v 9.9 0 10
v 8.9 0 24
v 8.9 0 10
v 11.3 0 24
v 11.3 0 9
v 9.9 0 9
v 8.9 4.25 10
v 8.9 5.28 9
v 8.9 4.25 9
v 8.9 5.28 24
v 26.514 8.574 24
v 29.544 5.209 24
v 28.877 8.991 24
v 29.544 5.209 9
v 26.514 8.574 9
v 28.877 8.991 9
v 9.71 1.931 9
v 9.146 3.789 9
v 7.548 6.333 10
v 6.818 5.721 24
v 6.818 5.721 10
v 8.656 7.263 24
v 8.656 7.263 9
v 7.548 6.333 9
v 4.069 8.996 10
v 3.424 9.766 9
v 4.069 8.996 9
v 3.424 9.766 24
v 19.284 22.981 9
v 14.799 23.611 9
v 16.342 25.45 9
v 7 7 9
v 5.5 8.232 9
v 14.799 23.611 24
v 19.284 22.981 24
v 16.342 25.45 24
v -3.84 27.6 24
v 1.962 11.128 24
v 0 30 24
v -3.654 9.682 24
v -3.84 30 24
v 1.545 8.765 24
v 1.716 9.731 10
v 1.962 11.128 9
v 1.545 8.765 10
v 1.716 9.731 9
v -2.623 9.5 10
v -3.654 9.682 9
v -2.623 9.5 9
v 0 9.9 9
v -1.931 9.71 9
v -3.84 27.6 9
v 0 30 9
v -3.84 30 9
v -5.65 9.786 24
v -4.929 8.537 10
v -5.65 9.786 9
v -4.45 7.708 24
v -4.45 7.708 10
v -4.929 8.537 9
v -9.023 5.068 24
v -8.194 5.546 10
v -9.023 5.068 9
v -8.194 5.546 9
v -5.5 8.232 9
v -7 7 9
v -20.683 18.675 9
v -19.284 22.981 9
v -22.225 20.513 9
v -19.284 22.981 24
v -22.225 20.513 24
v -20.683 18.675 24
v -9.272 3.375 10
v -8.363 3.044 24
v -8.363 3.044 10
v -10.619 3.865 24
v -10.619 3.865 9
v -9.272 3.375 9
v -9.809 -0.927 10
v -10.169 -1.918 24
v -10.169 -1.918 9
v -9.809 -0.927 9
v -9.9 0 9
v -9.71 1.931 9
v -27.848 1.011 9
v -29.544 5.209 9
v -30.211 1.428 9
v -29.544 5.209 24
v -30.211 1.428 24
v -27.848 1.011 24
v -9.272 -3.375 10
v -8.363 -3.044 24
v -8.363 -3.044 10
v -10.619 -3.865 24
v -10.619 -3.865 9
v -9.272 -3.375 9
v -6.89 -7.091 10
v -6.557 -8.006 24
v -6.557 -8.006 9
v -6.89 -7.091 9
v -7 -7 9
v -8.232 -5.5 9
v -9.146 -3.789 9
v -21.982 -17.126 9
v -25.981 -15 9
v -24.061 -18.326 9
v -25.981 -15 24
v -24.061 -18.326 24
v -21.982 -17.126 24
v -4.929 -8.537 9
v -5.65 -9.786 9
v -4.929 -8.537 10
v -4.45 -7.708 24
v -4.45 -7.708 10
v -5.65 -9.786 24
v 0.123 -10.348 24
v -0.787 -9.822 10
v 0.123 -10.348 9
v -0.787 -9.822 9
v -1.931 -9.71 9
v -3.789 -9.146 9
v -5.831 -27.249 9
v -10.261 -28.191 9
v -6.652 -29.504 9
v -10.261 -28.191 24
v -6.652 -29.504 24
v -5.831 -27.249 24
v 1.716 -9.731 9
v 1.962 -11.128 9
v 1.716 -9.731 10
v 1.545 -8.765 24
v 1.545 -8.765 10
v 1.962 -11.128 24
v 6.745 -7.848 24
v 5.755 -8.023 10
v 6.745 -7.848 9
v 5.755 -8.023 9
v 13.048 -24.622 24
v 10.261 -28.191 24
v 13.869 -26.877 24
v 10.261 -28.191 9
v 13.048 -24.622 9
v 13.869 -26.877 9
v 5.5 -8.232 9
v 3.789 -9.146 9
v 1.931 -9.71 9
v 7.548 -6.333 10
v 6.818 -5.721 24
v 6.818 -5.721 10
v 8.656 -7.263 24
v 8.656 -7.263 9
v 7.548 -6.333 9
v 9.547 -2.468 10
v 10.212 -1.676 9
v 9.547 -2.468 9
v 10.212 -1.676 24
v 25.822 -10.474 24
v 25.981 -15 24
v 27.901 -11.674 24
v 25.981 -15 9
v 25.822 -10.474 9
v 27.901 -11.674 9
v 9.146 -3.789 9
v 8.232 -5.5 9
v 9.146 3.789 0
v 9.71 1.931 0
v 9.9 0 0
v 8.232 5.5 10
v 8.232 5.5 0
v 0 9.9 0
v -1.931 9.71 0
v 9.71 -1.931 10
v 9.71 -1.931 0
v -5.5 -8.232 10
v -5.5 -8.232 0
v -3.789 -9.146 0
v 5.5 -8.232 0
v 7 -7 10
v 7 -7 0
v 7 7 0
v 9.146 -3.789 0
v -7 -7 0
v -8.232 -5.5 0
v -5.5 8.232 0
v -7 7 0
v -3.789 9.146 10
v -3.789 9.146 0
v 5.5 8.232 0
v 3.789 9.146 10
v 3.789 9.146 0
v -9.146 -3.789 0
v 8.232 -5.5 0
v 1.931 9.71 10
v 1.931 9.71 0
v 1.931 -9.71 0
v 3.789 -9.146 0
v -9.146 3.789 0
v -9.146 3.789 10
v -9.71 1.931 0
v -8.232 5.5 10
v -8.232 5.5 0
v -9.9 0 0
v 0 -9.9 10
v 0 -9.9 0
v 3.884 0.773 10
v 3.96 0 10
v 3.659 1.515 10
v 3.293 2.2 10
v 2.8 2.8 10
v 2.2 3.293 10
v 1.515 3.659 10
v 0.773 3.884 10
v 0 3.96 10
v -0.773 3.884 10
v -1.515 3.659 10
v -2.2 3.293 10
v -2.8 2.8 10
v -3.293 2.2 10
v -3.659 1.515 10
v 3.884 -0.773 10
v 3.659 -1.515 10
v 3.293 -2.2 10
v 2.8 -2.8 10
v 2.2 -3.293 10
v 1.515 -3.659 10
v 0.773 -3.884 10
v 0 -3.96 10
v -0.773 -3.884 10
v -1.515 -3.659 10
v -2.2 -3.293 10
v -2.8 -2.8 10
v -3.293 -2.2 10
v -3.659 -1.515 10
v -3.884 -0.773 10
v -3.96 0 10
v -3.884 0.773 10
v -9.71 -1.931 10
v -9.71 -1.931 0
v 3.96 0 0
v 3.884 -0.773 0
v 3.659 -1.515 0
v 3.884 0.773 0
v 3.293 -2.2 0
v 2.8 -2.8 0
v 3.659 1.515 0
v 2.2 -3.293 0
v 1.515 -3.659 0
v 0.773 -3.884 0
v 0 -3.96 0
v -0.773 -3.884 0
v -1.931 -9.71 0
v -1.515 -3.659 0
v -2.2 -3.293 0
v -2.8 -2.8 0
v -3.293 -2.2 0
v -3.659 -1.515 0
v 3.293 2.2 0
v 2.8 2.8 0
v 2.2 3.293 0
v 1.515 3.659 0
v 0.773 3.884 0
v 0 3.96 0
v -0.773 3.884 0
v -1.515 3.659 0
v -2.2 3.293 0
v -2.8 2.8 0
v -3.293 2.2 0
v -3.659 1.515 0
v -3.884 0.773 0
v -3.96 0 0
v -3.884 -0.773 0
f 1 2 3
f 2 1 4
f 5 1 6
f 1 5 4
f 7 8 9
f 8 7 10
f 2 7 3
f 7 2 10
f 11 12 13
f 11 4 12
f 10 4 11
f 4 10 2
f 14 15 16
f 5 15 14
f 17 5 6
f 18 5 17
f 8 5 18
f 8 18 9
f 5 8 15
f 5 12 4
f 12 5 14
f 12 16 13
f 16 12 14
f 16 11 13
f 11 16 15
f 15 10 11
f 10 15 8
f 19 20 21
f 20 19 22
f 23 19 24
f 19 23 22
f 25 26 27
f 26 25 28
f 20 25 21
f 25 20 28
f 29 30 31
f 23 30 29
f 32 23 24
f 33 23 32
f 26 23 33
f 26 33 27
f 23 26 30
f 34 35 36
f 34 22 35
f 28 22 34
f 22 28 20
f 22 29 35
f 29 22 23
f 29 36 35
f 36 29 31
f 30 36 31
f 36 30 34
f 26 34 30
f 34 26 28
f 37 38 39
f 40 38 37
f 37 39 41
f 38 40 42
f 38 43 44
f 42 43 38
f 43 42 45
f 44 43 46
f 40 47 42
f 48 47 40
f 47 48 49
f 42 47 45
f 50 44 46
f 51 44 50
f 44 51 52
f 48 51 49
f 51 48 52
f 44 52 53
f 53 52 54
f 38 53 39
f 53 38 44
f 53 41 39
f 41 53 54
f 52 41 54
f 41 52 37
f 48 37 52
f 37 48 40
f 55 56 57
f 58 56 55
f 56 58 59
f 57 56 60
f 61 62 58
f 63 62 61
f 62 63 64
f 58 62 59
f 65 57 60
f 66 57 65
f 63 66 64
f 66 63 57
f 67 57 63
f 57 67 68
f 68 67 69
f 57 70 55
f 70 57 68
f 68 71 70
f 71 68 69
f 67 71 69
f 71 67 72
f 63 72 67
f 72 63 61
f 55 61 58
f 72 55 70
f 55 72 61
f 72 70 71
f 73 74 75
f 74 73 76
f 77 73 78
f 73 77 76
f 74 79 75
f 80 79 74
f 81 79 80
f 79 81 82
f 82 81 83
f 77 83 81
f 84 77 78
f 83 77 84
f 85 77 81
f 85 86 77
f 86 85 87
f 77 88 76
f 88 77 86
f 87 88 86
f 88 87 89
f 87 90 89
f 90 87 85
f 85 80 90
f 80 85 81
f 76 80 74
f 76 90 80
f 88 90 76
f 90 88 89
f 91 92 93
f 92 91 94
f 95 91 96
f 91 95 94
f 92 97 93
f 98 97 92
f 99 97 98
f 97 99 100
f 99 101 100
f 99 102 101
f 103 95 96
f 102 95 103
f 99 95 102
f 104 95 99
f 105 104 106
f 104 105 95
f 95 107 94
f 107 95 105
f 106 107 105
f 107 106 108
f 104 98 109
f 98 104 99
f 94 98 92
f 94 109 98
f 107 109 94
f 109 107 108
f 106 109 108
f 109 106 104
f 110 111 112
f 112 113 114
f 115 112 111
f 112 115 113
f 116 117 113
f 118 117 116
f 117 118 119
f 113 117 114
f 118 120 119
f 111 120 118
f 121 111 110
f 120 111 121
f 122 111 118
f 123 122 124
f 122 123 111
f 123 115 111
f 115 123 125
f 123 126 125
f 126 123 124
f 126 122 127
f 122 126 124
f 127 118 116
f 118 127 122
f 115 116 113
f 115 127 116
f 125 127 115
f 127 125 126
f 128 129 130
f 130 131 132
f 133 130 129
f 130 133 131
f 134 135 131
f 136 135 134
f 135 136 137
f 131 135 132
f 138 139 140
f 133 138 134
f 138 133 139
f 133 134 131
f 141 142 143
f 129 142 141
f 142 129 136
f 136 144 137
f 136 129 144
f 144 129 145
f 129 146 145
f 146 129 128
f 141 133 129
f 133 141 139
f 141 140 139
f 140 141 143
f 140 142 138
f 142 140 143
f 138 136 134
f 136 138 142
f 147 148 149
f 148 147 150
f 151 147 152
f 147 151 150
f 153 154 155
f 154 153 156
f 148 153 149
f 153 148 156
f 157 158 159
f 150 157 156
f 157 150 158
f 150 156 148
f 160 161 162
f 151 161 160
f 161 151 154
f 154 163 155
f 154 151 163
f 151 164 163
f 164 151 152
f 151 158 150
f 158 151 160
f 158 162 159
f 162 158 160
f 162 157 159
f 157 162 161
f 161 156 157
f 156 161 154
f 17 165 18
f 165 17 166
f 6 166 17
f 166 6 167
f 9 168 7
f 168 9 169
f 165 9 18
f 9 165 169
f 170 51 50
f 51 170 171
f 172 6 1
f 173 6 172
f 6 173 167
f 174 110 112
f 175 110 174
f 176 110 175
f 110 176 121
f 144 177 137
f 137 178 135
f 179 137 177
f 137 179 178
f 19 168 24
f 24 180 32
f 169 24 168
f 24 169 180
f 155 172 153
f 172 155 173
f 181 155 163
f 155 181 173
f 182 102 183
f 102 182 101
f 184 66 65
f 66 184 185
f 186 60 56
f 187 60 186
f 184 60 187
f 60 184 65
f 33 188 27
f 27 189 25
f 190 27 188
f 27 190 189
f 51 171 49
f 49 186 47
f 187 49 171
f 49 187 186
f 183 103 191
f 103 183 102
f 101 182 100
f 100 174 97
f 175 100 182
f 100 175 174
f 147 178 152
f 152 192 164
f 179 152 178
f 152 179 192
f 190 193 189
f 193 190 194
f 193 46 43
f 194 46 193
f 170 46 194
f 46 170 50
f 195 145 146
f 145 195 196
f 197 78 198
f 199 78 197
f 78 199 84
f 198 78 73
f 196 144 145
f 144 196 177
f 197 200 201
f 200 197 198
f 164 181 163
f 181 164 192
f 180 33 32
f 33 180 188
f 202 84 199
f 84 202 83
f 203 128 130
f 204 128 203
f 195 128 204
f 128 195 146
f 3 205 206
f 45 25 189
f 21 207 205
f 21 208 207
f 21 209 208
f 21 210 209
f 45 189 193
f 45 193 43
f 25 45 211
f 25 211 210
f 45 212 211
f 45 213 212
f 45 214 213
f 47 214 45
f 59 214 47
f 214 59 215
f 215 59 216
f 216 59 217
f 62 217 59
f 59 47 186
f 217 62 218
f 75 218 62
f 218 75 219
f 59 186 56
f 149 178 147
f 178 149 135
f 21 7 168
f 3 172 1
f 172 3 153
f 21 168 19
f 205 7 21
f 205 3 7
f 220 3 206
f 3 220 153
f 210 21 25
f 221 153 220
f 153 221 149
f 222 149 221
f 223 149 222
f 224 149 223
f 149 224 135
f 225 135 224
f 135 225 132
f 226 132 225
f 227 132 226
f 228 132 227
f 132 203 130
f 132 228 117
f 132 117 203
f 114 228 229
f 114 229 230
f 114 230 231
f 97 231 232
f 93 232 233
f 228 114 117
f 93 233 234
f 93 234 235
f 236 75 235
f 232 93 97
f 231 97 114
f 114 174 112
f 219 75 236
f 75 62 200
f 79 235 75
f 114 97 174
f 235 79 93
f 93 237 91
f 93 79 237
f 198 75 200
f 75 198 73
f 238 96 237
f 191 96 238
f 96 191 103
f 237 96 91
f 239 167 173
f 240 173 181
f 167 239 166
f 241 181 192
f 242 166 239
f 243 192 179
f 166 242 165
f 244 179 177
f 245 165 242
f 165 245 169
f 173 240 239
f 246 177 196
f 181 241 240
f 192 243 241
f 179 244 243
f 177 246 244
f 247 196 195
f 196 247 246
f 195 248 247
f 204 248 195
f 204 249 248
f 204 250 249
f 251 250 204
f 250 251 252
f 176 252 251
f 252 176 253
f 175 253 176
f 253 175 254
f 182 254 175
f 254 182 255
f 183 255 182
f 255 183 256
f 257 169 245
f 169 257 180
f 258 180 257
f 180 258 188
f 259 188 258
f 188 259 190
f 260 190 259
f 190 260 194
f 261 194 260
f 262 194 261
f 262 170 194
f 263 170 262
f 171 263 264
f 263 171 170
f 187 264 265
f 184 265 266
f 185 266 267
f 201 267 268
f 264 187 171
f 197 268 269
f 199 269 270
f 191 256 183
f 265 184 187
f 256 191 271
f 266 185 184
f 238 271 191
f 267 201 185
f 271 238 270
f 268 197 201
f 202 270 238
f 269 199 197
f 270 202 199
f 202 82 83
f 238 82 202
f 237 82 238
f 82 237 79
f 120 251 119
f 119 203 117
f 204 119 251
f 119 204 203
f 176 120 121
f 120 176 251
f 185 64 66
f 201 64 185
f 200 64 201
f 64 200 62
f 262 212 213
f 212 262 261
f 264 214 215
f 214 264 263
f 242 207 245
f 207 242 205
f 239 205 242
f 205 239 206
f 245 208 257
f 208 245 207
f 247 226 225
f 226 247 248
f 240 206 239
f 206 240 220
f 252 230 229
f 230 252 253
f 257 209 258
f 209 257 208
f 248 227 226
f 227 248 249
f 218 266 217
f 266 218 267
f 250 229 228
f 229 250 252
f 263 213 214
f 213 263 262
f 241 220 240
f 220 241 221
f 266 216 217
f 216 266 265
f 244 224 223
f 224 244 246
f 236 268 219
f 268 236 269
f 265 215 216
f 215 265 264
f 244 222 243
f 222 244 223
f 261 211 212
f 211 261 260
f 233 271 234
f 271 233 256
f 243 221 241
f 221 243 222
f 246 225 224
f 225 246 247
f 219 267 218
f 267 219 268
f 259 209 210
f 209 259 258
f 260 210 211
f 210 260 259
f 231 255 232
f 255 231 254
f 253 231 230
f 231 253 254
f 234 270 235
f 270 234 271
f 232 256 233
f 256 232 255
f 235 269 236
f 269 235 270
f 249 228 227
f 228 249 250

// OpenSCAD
$fn = 32;

// ----------------------------------------------------------------------
// Impeller: 60 mm, 9 blades, 24 mm tall
// ----------------------------------------------------------------------

// --- parameters (mm) ---
center_d = 19.8;          // hub diameter
center_h = 10;            // hub height
wheel_d = 60;             // outer diameter over the blades
blade_count = 9;          // number of blades
blade_t = 2.4;            // blade thickness
blade_h = 14;             // blade height
blade_in_r = 8.9;         // blade root radius
blade_out_r = 27.6;       // blade tip radius
sweep = 10;               // blade sweep, degrees
bore_d = 7.92;            // shaft bore

module hub() {
  cylinder(h = center_h, d = center_d);
}

module blade() {
  /* blade swept between two boxes: hull of the root and the tip section */
  hull() {
    translate([blade_in_r, 0, center_h - 1])
      cube([blade_t, blade_t * 2.2, blade_h + 1], center = false);
    rotate([0, 0, sweep])
      translate([blade_out_r, 0, center_h - 1])
        cube([blade_t, blade_t * 1.6, blade_h + 1], center = false);
  }
}

module blades() {
  for (i = [0 : blade_count - 1])
    rotate([0, 0, i * 360 / blade_count]) blade();
}

difference() {
  union() {
    hub();
    blades();
  }
  translate([0, 0, -1]) cylinder(h = center_h + blade_h + 0 + 3, d = bore_d);
}
